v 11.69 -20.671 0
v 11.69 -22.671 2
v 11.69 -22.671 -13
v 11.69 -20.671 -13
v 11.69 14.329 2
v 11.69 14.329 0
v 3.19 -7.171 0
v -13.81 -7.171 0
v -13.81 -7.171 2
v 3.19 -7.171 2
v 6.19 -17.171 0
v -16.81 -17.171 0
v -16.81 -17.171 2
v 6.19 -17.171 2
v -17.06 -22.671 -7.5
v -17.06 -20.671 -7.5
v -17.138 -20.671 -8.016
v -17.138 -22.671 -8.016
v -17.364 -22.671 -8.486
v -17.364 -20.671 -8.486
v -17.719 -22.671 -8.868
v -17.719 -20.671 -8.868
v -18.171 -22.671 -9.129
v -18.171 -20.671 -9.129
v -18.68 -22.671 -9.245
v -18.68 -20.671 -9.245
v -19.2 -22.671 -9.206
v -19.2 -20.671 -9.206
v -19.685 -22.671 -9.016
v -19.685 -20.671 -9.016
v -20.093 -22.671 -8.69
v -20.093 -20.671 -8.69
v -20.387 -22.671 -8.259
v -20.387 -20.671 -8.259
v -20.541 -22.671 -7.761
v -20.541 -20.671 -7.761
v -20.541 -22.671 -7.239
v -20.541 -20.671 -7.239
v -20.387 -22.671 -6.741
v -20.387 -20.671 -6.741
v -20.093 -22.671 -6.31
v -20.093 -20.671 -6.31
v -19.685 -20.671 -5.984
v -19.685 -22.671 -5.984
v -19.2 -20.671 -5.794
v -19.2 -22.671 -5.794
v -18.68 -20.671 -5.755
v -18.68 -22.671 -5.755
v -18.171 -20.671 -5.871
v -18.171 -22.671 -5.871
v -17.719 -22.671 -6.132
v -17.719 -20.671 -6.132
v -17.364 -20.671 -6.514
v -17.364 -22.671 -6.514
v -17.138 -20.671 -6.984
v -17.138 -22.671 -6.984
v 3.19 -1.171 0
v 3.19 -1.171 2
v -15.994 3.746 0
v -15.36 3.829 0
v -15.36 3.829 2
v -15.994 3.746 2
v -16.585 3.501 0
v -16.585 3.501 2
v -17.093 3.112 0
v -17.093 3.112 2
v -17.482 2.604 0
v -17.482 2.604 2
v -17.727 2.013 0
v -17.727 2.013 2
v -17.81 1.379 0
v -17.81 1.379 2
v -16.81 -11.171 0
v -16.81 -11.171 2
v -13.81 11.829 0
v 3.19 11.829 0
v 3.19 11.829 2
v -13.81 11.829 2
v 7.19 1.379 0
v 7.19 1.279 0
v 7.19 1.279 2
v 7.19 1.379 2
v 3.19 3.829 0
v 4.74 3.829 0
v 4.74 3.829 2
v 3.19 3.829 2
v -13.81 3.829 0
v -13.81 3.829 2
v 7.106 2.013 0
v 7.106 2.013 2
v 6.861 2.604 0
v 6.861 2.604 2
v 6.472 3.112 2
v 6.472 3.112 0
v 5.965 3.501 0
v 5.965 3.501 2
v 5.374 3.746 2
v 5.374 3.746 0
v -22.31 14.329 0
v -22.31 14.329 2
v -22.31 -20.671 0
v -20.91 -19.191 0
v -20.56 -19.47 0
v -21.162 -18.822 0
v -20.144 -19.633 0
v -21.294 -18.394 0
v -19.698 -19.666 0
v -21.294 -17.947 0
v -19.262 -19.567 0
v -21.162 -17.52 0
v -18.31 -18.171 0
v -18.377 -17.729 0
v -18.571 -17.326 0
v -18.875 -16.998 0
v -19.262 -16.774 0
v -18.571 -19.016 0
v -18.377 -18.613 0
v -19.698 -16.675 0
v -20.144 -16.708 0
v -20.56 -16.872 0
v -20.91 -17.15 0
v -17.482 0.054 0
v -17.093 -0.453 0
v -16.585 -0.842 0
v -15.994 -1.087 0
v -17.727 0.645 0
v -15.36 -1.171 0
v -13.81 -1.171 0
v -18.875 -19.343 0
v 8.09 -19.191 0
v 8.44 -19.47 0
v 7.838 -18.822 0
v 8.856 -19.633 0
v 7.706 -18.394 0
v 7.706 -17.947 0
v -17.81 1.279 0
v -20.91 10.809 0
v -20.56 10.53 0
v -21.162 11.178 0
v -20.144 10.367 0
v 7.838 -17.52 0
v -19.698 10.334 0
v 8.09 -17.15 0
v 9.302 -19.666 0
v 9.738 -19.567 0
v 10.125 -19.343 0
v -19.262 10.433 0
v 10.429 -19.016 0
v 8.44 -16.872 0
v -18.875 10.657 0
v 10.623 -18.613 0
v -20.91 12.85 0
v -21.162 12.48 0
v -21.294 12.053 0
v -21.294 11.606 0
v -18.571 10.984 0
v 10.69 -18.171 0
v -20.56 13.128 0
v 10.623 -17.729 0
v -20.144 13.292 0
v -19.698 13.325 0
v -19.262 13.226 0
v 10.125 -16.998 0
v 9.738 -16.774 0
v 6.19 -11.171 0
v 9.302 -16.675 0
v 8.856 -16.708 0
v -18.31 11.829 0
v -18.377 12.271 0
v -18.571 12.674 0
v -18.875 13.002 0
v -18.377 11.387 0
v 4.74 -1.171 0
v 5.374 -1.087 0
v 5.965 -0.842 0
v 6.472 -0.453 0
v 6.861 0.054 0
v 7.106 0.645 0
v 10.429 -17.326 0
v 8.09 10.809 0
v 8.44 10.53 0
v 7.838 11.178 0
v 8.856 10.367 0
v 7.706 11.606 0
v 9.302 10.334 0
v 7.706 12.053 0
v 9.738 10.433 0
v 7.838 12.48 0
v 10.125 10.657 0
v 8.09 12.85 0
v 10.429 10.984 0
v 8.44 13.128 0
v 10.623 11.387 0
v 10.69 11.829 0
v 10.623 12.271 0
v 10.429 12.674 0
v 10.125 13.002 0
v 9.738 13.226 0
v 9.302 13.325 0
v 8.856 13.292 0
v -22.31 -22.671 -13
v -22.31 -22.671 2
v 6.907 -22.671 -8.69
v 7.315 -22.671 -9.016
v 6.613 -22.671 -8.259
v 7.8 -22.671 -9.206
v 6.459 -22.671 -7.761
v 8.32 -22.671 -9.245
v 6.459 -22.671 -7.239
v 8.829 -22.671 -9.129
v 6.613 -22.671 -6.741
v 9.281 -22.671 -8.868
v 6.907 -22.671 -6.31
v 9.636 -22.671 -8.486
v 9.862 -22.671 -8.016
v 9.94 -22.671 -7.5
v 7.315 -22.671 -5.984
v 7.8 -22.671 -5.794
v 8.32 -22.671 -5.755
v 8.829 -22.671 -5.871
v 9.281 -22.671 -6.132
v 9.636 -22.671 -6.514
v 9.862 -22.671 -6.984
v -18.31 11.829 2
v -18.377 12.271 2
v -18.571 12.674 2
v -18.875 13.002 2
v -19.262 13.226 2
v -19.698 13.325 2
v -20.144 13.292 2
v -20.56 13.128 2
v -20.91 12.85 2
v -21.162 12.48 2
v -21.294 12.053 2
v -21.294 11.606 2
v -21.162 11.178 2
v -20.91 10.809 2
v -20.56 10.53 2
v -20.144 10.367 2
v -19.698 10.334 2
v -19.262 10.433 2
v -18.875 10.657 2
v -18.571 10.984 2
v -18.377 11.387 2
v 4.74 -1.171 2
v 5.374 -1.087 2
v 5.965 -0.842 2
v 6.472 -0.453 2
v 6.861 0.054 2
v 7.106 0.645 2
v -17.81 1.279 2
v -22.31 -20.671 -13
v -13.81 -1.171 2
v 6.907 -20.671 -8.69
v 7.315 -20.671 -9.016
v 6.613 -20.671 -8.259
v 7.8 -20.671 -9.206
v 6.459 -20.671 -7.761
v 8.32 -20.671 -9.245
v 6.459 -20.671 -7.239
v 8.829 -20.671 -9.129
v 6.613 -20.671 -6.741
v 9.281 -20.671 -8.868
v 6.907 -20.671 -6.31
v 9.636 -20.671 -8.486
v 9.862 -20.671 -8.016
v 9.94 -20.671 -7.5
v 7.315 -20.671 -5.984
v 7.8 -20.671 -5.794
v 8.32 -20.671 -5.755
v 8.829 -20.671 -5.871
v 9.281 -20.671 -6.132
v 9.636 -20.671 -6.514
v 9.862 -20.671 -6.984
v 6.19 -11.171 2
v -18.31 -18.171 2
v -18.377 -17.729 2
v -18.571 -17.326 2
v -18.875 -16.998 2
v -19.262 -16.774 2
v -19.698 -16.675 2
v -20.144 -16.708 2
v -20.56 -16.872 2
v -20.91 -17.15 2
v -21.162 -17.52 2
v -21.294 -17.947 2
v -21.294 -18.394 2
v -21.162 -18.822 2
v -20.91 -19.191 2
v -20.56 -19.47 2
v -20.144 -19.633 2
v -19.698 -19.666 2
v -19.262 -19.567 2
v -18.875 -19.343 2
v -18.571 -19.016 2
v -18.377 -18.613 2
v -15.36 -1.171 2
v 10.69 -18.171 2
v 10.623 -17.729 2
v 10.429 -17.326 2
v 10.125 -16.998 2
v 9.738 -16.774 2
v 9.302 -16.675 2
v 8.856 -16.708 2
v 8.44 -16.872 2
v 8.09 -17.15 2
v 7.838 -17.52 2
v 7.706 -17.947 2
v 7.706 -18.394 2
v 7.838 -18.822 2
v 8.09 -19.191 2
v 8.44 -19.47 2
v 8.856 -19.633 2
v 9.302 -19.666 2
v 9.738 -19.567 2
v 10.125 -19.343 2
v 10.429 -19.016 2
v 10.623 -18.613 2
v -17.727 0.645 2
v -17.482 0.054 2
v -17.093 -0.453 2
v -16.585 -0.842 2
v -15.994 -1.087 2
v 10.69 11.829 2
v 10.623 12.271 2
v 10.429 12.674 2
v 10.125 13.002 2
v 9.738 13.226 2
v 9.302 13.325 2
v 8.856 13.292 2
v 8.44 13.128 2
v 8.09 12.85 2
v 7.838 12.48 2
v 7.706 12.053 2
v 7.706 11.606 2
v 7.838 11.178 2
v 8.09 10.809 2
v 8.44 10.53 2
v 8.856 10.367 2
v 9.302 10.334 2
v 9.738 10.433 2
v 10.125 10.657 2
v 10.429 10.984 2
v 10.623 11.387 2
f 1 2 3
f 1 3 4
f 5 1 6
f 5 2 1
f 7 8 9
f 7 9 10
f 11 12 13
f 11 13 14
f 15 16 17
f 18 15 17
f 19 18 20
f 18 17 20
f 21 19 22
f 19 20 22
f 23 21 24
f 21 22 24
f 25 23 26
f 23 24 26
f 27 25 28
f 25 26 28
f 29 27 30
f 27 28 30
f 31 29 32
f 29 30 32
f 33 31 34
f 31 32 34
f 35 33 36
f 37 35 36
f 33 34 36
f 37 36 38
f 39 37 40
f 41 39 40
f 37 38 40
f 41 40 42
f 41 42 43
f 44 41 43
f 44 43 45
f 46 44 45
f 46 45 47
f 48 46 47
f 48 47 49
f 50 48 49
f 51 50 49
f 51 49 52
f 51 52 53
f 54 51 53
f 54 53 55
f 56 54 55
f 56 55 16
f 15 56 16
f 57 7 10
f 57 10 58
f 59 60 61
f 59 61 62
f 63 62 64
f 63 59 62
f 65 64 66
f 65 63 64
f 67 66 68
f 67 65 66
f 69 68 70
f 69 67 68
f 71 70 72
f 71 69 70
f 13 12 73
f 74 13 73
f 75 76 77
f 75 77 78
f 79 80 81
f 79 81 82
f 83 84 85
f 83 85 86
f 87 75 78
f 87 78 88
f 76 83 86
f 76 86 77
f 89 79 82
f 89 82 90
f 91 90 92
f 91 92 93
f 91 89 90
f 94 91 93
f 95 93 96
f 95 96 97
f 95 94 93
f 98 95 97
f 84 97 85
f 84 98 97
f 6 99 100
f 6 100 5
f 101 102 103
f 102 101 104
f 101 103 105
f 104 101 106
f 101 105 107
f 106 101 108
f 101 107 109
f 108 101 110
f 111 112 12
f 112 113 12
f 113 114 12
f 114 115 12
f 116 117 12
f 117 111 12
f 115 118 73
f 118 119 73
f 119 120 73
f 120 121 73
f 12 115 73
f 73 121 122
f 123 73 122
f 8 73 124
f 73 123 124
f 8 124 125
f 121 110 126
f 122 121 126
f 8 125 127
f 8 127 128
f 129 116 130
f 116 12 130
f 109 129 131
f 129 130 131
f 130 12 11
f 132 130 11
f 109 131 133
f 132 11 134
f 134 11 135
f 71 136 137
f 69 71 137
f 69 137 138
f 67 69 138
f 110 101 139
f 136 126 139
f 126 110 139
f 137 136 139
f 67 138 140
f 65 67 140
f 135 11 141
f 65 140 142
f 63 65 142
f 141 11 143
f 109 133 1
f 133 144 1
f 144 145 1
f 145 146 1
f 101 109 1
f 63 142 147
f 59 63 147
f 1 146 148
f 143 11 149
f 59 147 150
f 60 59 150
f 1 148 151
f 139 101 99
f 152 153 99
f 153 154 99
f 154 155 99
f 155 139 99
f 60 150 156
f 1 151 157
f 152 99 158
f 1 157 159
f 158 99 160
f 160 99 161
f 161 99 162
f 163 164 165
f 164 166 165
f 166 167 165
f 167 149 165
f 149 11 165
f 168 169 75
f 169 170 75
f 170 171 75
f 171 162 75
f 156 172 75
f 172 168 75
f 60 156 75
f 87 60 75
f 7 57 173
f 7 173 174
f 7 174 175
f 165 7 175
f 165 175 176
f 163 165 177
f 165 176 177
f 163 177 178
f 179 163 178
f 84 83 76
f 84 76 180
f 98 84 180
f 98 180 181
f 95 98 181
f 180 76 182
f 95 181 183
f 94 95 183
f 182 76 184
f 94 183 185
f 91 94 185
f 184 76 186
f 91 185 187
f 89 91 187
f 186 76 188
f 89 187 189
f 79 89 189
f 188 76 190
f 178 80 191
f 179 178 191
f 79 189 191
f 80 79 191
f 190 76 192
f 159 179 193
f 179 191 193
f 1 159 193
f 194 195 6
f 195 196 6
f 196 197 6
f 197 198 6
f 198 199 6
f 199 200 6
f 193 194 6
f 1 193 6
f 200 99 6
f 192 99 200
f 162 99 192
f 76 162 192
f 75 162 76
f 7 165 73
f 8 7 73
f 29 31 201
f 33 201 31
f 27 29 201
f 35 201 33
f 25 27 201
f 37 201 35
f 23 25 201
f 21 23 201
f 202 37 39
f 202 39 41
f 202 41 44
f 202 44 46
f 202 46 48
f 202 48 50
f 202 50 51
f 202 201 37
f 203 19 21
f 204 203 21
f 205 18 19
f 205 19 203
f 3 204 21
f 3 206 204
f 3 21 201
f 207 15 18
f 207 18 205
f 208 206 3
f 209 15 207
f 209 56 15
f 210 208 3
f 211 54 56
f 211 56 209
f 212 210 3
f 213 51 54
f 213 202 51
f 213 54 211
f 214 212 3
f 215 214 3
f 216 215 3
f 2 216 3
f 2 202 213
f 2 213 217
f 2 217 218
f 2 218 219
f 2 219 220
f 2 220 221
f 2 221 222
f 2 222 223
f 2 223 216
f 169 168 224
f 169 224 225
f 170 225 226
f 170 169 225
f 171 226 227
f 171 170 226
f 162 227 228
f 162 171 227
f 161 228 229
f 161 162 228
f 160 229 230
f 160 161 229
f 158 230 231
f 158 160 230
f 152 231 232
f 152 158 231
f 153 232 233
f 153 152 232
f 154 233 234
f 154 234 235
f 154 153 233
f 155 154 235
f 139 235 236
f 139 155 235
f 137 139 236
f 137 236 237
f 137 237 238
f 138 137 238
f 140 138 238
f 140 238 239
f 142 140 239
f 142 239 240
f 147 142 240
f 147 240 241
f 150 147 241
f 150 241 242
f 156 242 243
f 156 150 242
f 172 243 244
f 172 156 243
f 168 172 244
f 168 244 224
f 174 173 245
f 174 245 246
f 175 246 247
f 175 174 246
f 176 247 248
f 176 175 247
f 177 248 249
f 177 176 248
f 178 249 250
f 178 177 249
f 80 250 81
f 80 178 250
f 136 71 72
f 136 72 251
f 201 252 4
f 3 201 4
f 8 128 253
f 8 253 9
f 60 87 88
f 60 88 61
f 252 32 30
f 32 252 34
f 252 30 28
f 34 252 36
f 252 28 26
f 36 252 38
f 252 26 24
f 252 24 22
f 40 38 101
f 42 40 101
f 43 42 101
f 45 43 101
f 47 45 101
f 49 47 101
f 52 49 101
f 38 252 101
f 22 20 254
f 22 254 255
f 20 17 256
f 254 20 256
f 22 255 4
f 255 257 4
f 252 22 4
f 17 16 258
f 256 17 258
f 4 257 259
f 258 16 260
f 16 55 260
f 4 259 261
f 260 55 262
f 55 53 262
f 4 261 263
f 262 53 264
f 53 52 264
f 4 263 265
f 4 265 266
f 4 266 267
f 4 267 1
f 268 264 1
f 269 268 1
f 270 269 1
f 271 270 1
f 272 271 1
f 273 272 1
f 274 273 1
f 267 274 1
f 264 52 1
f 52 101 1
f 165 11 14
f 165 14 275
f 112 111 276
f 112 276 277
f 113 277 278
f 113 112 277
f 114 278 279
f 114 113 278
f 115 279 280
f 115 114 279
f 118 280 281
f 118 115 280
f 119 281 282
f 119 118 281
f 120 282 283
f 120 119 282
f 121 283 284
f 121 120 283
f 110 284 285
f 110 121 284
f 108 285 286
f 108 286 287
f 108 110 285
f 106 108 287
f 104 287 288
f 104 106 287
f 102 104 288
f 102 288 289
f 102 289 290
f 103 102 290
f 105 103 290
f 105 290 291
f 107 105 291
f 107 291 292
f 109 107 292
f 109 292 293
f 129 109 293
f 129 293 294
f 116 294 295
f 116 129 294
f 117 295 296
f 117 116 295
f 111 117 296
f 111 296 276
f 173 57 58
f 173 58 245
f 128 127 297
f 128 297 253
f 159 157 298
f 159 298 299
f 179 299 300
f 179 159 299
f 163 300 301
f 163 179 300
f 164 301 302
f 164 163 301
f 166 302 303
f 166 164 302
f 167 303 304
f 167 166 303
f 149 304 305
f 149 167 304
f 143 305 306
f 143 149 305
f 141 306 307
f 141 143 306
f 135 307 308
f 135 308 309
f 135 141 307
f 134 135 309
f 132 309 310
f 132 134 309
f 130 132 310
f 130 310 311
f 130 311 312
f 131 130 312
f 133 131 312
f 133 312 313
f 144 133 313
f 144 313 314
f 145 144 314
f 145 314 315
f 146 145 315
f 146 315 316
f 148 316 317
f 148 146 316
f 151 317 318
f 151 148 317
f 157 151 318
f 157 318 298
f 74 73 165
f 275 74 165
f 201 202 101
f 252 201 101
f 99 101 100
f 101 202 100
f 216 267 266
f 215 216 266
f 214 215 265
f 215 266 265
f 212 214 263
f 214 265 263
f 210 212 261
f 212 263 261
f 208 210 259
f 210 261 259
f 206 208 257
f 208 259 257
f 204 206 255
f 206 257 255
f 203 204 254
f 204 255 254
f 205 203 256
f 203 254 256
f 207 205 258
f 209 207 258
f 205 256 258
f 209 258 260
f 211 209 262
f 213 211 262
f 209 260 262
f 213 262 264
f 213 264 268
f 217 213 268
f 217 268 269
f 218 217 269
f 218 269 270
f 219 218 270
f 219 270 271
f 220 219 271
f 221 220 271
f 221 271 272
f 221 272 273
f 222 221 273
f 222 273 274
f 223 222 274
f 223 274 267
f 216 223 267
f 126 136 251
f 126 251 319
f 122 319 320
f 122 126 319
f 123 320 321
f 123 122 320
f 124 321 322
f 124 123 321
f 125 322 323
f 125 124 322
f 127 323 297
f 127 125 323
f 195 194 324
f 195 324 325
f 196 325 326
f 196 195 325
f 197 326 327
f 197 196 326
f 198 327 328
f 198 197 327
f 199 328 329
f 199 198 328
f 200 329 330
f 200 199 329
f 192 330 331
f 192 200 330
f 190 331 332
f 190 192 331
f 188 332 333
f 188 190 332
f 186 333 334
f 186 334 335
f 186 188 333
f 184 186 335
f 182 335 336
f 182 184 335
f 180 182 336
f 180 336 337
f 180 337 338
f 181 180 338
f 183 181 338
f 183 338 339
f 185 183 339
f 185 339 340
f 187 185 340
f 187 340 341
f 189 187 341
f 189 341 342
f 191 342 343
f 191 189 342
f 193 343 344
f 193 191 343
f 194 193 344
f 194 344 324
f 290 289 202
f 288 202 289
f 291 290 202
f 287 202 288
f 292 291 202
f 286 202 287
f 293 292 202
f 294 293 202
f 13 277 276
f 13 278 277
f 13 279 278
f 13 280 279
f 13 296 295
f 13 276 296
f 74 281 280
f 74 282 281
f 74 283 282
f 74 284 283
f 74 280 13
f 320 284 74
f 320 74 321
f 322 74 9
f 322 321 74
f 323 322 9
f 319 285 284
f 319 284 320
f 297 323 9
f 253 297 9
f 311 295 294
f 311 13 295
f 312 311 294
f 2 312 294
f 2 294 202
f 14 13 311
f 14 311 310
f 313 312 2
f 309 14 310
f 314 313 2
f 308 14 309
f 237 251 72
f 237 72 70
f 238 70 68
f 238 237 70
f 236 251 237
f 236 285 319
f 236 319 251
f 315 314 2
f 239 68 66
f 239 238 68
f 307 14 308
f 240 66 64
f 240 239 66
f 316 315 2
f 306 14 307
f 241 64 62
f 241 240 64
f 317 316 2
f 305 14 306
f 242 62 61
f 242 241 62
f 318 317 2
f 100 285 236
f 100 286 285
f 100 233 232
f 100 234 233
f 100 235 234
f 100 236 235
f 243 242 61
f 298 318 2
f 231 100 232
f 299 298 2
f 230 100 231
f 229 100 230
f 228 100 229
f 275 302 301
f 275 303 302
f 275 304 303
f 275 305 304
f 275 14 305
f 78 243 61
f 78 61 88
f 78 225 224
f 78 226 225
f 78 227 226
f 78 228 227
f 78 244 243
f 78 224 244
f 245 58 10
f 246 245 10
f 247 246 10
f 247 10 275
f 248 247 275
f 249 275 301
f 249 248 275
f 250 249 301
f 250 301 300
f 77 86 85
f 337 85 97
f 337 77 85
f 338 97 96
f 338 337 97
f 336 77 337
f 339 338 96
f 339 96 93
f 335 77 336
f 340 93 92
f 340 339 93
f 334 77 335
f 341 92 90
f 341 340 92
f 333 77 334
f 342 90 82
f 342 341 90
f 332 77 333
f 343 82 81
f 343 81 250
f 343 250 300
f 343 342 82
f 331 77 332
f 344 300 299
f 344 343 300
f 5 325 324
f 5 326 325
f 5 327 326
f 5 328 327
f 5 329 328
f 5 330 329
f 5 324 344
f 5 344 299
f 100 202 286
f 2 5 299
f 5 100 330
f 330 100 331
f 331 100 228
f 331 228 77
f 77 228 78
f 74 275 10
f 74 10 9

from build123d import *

# Parameters (mm, degrees)
ESBO_O1_W                = 34
ESBO_O1_H                = 35
ESBO_O1_R                = 1.5
ESBO_O1_W_2              = 23
ESBO_O1_H_2              = 6
RESSALTO_EXTRUS_O1_DEPTH = 2
ESBO_O2_W                = 34
ESBO_O2_H                = 2
RESSALTO_EXTRUS_O2_DEPTH = 15
ESBO_O3_R                = 1.75
CORTE_EXTRUS_O1_DEPTH    = 15


with BuildPart() as part:
    # Esboço1 → Ressalto-extrusão1 (new body)
    with BuildSketch(Plane.XY):
        with Locations((-5.310292873, -3.170678153)):
            Rectangle(ESBO_O1_W, ESBO_O1_H)
        with Locations((-19.810292873, 11.829321847)):
            Circle(ESBO_O1_R, mode=Mode.SUBTRACT)
        with Locations((9.189707127, 11.829321847)):
            Circle(ESBO_O1_R, mode=Mode.SUBTRACT)
        with Locations((-19.810292873, -18.170678153)):
            Circle(ESBO_O1_R, mode=Mode.SUBTRACT)
        with Locations((9.189707127, -18.170678153)):
            Circle(ESBO_O1_R, mode=Mode.SUBTRACT)
        with BuildLine():
            Line((-13.810292873, -1.170678153), (-13.810292873, -7.170678153))
            Line((-13.810292873, -7.170678153), (3.189707127, -7.170678153))
            Line((3.189707127, -7.170678153), (3.189707127, -1.170678153))
            Line((3.189707127, -1.170678153), (4.739707127, -1.170678153))
            ThreePointArc((4.739707127, -1.170678153), (6.472118741, -0.453089767), (7.189707127, 1.279321847))
            Line((7.189707127, 1.279321847), (7.189707127, 1.379321847))
            ThreePointArc((7.189707127, 1.379321847), (6.472118741, 3.11173346), (4.739707127, 3.829321847))
            Line((4.739707127, 3.829321847), (3.189707127, 3.829321847))
            Line((3.189707127, 3.829321847), (3.189707127, 11.829321847))
            Line((3.189707127, 11.829321847), (-13.810292873, 11.829321847))
            Line((-13.810292873, 11.829321847), (-13.810292873, 3.829321847))
            Line((-13.810292873, 3.829321847), (-15.360292873, 3.829321847))
            ThreePointArc((-15.360292873, 3.829321847), (-17.092704487, 3.11173346), (-17.810292873, 1.379321847))
            Line((-17.810292873, 1.379321847), (-17.810292873, 1.279321847))
            ThreePointArc((-17.810292873, 1.279321847), (-17.092704487, -0.453089767), (-15.360292873, -1.170678153))
            Line((-15.360292873, -1.170678153), (-13.810292873, -1.170678153))
        make_face(mode=Mode.SUBTRACT)
        with Locations((-5.310292873, -14.170678153)):
            Rectangle(ESBO_O1_W_2, ESBO_O1_H_2, mode=Mode.SUBTRACT)
    extrude(amount=RESSALTO_EXTRUS_O1_DEPTH)

    # Esboço2 → Ressalto-extrusão2 (add)
    with BuildSketch(Plane.XY.offset(2)):
        with Locations((-5.310292873, -21.670678153)):
            Rectangle(ESBO_O2_W, ESBO_O2_H)
    extrude(amount=-RESSALTO_EXTRUS_O2_DEPTH)

    # Esboço3 → Corte-extrusão1 (cut)
    with BuildSketch(Plane(origin=(0, -20.670678153, 0), x_dir=(1, 0, 0), z_dir=(0, 1, 0))):
        with Locations((8.189707127, 7.5)):
            Circle(ESBO_O3_R)
        with Locations((-18.810292873, 7.5)):
            Circle(ESBO_O3_R)
    extrude(amount=-CORTE_EXTRUS_O1_DEPTH, mode=Mode.SUBTRACT)


solid = part.part
